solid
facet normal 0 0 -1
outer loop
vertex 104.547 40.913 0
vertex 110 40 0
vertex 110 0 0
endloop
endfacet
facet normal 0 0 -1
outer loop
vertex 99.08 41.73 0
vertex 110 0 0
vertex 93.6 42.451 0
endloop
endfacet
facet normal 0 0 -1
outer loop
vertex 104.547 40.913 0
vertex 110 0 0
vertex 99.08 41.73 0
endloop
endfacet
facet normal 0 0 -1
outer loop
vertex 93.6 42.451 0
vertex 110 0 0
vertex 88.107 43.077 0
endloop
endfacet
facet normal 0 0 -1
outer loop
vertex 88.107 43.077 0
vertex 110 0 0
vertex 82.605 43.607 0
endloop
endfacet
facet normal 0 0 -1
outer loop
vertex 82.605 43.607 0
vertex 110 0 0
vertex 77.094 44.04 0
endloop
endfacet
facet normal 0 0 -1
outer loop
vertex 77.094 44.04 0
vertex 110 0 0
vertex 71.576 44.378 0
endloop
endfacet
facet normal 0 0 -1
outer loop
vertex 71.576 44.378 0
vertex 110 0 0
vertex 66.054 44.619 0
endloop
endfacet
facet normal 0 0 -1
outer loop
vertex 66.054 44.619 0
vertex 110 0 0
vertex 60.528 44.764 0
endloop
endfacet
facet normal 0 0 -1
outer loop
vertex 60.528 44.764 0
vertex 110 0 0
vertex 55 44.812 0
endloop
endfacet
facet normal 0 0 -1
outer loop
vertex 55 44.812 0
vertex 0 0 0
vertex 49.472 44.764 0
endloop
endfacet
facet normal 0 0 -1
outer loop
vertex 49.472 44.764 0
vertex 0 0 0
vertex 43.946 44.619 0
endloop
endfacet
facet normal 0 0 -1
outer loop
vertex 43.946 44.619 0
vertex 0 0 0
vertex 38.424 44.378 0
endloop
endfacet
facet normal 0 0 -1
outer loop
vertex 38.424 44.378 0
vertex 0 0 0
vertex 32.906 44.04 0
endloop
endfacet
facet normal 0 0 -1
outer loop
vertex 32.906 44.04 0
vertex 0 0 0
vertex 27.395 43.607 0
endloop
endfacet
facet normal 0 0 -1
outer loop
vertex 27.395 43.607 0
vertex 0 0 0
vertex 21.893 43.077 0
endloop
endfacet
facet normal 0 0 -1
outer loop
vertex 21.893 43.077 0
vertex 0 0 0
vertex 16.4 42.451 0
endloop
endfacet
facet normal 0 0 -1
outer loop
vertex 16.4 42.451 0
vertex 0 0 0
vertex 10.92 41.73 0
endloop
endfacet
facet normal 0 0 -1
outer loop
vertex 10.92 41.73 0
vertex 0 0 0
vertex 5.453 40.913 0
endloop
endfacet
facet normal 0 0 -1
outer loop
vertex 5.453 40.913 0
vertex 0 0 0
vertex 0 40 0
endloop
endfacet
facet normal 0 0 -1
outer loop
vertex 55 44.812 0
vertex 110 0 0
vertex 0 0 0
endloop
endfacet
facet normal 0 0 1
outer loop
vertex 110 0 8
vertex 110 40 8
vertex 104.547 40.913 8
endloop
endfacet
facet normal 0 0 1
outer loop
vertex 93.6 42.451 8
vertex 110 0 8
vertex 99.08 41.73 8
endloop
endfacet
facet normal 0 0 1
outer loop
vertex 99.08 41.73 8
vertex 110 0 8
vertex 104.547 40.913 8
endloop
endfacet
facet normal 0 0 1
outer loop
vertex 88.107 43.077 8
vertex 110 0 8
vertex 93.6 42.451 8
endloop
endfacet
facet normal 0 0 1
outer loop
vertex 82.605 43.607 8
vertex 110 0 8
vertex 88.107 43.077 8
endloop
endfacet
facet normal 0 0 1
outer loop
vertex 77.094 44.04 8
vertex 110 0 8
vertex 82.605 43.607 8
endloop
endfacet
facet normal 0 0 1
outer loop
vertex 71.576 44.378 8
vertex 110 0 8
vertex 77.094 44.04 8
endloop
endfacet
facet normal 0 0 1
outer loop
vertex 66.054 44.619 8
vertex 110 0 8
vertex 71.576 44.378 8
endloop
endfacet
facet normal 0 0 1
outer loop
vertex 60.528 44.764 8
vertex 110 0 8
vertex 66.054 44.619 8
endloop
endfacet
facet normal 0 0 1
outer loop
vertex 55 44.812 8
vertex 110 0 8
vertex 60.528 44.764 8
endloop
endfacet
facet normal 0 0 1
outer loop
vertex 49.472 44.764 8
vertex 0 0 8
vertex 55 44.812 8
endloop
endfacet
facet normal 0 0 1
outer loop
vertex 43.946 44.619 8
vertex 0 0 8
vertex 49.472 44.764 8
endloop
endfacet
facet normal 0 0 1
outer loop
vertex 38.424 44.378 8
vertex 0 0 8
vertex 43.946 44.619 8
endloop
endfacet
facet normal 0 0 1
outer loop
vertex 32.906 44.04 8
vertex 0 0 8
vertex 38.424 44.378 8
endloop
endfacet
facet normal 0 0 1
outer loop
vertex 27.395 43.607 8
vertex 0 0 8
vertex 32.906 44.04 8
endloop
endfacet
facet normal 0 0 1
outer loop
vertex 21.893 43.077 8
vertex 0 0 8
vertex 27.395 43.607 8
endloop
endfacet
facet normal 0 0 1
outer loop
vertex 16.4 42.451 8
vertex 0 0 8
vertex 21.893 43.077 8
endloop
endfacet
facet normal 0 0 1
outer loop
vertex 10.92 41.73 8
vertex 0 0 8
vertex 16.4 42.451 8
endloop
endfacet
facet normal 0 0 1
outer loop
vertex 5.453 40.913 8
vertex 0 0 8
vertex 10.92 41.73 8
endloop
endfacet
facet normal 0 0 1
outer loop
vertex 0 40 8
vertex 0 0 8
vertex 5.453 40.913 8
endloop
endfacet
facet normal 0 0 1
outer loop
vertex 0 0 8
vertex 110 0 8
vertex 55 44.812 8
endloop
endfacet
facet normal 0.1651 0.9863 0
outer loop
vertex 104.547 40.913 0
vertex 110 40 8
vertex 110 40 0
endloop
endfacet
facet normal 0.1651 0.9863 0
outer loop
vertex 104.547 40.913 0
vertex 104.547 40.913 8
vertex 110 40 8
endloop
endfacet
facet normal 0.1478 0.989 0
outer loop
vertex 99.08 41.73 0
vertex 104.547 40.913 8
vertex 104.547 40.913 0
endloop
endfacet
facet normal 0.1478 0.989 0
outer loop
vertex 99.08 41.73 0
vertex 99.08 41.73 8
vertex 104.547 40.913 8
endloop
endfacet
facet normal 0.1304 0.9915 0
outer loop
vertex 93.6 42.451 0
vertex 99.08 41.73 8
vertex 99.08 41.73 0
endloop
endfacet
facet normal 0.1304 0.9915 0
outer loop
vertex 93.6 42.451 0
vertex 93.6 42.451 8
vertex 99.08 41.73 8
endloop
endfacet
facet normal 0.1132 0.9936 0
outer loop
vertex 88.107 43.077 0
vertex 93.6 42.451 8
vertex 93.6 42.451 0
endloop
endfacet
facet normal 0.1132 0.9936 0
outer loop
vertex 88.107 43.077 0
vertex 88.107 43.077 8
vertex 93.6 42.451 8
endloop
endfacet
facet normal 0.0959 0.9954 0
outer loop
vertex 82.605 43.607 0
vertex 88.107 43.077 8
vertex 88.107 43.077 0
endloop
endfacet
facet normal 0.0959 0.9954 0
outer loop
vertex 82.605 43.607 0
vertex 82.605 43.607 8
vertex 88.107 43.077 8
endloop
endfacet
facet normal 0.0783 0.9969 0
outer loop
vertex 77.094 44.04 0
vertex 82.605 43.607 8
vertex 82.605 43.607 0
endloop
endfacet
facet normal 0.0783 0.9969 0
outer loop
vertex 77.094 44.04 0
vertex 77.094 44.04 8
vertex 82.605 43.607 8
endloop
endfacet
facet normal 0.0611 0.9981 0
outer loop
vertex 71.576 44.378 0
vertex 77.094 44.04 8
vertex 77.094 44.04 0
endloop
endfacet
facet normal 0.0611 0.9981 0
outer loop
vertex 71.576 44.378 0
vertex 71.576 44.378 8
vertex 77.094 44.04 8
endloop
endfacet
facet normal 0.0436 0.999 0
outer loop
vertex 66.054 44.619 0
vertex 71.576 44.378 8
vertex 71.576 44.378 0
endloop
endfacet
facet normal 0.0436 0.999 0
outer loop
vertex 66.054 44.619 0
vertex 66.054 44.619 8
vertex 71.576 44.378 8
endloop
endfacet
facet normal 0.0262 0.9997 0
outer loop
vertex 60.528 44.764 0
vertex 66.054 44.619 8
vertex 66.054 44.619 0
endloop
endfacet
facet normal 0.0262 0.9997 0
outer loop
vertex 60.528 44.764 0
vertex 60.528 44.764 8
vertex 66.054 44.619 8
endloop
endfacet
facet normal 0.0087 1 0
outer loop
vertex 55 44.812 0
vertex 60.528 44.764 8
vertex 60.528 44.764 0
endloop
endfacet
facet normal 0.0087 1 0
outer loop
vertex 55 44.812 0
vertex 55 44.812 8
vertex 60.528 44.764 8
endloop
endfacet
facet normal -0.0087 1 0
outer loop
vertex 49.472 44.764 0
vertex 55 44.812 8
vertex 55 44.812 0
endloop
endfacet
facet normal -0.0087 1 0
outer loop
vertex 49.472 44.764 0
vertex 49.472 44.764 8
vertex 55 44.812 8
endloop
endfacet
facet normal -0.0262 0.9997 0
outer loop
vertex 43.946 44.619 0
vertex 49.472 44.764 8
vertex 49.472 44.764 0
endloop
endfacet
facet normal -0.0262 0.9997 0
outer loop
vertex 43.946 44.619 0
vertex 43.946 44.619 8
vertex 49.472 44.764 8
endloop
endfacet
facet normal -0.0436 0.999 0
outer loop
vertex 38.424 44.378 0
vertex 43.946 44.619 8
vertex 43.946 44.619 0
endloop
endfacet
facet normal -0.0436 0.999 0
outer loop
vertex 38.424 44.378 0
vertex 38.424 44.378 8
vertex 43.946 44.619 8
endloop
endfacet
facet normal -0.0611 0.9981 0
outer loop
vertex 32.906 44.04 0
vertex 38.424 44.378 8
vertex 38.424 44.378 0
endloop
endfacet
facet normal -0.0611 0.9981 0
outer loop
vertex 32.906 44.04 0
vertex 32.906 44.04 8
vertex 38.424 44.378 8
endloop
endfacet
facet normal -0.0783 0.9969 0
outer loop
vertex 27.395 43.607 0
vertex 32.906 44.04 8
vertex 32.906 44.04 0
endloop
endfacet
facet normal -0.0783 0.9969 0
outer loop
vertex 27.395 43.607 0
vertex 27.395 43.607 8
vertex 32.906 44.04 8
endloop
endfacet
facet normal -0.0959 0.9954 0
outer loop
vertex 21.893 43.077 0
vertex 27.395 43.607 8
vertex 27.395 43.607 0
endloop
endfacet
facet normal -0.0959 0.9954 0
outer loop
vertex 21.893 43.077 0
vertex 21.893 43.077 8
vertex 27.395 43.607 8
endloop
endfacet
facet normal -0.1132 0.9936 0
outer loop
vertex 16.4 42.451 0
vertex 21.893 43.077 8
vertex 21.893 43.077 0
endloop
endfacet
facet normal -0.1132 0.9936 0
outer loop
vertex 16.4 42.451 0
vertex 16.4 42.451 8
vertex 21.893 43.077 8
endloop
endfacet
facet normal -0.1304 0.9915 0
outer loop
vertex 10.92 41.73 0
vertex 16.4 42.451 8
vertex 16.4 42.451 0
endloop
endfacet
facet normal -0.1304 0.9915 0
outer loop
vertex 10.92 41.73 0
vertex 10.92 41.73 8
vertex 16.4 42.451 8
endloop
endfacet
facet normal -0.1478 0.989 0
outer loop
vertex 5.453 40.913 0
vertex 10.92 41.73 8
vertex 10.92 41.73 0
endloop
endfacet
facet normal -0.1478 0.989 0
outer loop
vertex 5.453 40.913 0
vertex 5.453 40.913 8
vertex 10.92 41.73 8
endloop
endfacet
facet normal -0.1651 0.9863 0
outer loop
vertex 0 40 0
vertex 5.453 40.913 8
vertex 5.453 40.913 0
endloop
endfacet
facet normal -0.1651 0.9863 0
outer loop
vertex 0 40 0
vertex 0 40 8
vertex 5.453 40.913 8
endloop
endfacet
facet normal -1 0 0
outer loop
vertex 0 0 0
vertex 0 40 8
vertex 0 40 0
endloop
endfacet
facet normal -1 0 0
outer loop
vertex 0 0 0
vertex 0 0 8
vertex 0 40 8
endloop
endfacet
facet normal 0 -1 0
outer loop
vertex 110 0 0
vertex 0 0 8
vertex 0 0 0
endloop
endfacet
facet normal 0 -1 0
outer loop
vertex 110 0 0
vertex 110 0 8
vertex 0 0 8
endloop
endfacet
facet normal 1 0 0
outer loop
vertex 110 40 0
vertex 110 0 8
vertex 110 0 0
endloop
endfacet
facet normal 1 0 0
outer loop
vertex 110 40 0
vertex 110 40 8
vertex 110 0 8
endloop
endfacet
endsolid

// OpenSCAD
$fn = 32;

// ----------------------------------------------------------------------
// Arc profile plate: crown, 23 points
// ----------------------------------------------------------------------

// --- parameters (mm) ---
bar_l = 110;              // bar length, X
bar_w = 40;               // bar height at the ends, Y
arc_r = 316.73;           // radius of the crown arc
arc_angle = 20;           // crown arc angle, degrees
crown_rise = 4.81;        // rise of the crown over the ends
arc_step = 1;             // sampling step of the crown arc, degrees
plate_t = 8;              // plate thickness, Z
fit_tol = 0.1;            // declared fit tolerance (prompt contract)
free_tol = 0.3;           // declared free tolerance (prompt contract)

bbox_y = bar_w + crown_rise;  // full height with the crown

profile = [[110, 40], [104.547, 40.913], [99.08, 41.73], [93.6, 42.451], [88.107, 43.077], [82.605, 43.607], [77.094, 44.04], [71.576, 44.378], [66.054, 44.619], [60.528, 44.764], [55, 44.812], [49.472, 44.764], [43.946, 44.619], [38.424, 44.378], [32.906, 44.04], [27.395, 43.607], [21.893, 43.077], [16.4, 42.451], [10.92, 41.73], [5.453, 40.913], [0, 40], [0, 0], [110, 0]];  // primary outline, 23 points, counter clockwise

// --- the one profile operation ---
linear_extrude(height = plate_t) polygon(points = profile);
